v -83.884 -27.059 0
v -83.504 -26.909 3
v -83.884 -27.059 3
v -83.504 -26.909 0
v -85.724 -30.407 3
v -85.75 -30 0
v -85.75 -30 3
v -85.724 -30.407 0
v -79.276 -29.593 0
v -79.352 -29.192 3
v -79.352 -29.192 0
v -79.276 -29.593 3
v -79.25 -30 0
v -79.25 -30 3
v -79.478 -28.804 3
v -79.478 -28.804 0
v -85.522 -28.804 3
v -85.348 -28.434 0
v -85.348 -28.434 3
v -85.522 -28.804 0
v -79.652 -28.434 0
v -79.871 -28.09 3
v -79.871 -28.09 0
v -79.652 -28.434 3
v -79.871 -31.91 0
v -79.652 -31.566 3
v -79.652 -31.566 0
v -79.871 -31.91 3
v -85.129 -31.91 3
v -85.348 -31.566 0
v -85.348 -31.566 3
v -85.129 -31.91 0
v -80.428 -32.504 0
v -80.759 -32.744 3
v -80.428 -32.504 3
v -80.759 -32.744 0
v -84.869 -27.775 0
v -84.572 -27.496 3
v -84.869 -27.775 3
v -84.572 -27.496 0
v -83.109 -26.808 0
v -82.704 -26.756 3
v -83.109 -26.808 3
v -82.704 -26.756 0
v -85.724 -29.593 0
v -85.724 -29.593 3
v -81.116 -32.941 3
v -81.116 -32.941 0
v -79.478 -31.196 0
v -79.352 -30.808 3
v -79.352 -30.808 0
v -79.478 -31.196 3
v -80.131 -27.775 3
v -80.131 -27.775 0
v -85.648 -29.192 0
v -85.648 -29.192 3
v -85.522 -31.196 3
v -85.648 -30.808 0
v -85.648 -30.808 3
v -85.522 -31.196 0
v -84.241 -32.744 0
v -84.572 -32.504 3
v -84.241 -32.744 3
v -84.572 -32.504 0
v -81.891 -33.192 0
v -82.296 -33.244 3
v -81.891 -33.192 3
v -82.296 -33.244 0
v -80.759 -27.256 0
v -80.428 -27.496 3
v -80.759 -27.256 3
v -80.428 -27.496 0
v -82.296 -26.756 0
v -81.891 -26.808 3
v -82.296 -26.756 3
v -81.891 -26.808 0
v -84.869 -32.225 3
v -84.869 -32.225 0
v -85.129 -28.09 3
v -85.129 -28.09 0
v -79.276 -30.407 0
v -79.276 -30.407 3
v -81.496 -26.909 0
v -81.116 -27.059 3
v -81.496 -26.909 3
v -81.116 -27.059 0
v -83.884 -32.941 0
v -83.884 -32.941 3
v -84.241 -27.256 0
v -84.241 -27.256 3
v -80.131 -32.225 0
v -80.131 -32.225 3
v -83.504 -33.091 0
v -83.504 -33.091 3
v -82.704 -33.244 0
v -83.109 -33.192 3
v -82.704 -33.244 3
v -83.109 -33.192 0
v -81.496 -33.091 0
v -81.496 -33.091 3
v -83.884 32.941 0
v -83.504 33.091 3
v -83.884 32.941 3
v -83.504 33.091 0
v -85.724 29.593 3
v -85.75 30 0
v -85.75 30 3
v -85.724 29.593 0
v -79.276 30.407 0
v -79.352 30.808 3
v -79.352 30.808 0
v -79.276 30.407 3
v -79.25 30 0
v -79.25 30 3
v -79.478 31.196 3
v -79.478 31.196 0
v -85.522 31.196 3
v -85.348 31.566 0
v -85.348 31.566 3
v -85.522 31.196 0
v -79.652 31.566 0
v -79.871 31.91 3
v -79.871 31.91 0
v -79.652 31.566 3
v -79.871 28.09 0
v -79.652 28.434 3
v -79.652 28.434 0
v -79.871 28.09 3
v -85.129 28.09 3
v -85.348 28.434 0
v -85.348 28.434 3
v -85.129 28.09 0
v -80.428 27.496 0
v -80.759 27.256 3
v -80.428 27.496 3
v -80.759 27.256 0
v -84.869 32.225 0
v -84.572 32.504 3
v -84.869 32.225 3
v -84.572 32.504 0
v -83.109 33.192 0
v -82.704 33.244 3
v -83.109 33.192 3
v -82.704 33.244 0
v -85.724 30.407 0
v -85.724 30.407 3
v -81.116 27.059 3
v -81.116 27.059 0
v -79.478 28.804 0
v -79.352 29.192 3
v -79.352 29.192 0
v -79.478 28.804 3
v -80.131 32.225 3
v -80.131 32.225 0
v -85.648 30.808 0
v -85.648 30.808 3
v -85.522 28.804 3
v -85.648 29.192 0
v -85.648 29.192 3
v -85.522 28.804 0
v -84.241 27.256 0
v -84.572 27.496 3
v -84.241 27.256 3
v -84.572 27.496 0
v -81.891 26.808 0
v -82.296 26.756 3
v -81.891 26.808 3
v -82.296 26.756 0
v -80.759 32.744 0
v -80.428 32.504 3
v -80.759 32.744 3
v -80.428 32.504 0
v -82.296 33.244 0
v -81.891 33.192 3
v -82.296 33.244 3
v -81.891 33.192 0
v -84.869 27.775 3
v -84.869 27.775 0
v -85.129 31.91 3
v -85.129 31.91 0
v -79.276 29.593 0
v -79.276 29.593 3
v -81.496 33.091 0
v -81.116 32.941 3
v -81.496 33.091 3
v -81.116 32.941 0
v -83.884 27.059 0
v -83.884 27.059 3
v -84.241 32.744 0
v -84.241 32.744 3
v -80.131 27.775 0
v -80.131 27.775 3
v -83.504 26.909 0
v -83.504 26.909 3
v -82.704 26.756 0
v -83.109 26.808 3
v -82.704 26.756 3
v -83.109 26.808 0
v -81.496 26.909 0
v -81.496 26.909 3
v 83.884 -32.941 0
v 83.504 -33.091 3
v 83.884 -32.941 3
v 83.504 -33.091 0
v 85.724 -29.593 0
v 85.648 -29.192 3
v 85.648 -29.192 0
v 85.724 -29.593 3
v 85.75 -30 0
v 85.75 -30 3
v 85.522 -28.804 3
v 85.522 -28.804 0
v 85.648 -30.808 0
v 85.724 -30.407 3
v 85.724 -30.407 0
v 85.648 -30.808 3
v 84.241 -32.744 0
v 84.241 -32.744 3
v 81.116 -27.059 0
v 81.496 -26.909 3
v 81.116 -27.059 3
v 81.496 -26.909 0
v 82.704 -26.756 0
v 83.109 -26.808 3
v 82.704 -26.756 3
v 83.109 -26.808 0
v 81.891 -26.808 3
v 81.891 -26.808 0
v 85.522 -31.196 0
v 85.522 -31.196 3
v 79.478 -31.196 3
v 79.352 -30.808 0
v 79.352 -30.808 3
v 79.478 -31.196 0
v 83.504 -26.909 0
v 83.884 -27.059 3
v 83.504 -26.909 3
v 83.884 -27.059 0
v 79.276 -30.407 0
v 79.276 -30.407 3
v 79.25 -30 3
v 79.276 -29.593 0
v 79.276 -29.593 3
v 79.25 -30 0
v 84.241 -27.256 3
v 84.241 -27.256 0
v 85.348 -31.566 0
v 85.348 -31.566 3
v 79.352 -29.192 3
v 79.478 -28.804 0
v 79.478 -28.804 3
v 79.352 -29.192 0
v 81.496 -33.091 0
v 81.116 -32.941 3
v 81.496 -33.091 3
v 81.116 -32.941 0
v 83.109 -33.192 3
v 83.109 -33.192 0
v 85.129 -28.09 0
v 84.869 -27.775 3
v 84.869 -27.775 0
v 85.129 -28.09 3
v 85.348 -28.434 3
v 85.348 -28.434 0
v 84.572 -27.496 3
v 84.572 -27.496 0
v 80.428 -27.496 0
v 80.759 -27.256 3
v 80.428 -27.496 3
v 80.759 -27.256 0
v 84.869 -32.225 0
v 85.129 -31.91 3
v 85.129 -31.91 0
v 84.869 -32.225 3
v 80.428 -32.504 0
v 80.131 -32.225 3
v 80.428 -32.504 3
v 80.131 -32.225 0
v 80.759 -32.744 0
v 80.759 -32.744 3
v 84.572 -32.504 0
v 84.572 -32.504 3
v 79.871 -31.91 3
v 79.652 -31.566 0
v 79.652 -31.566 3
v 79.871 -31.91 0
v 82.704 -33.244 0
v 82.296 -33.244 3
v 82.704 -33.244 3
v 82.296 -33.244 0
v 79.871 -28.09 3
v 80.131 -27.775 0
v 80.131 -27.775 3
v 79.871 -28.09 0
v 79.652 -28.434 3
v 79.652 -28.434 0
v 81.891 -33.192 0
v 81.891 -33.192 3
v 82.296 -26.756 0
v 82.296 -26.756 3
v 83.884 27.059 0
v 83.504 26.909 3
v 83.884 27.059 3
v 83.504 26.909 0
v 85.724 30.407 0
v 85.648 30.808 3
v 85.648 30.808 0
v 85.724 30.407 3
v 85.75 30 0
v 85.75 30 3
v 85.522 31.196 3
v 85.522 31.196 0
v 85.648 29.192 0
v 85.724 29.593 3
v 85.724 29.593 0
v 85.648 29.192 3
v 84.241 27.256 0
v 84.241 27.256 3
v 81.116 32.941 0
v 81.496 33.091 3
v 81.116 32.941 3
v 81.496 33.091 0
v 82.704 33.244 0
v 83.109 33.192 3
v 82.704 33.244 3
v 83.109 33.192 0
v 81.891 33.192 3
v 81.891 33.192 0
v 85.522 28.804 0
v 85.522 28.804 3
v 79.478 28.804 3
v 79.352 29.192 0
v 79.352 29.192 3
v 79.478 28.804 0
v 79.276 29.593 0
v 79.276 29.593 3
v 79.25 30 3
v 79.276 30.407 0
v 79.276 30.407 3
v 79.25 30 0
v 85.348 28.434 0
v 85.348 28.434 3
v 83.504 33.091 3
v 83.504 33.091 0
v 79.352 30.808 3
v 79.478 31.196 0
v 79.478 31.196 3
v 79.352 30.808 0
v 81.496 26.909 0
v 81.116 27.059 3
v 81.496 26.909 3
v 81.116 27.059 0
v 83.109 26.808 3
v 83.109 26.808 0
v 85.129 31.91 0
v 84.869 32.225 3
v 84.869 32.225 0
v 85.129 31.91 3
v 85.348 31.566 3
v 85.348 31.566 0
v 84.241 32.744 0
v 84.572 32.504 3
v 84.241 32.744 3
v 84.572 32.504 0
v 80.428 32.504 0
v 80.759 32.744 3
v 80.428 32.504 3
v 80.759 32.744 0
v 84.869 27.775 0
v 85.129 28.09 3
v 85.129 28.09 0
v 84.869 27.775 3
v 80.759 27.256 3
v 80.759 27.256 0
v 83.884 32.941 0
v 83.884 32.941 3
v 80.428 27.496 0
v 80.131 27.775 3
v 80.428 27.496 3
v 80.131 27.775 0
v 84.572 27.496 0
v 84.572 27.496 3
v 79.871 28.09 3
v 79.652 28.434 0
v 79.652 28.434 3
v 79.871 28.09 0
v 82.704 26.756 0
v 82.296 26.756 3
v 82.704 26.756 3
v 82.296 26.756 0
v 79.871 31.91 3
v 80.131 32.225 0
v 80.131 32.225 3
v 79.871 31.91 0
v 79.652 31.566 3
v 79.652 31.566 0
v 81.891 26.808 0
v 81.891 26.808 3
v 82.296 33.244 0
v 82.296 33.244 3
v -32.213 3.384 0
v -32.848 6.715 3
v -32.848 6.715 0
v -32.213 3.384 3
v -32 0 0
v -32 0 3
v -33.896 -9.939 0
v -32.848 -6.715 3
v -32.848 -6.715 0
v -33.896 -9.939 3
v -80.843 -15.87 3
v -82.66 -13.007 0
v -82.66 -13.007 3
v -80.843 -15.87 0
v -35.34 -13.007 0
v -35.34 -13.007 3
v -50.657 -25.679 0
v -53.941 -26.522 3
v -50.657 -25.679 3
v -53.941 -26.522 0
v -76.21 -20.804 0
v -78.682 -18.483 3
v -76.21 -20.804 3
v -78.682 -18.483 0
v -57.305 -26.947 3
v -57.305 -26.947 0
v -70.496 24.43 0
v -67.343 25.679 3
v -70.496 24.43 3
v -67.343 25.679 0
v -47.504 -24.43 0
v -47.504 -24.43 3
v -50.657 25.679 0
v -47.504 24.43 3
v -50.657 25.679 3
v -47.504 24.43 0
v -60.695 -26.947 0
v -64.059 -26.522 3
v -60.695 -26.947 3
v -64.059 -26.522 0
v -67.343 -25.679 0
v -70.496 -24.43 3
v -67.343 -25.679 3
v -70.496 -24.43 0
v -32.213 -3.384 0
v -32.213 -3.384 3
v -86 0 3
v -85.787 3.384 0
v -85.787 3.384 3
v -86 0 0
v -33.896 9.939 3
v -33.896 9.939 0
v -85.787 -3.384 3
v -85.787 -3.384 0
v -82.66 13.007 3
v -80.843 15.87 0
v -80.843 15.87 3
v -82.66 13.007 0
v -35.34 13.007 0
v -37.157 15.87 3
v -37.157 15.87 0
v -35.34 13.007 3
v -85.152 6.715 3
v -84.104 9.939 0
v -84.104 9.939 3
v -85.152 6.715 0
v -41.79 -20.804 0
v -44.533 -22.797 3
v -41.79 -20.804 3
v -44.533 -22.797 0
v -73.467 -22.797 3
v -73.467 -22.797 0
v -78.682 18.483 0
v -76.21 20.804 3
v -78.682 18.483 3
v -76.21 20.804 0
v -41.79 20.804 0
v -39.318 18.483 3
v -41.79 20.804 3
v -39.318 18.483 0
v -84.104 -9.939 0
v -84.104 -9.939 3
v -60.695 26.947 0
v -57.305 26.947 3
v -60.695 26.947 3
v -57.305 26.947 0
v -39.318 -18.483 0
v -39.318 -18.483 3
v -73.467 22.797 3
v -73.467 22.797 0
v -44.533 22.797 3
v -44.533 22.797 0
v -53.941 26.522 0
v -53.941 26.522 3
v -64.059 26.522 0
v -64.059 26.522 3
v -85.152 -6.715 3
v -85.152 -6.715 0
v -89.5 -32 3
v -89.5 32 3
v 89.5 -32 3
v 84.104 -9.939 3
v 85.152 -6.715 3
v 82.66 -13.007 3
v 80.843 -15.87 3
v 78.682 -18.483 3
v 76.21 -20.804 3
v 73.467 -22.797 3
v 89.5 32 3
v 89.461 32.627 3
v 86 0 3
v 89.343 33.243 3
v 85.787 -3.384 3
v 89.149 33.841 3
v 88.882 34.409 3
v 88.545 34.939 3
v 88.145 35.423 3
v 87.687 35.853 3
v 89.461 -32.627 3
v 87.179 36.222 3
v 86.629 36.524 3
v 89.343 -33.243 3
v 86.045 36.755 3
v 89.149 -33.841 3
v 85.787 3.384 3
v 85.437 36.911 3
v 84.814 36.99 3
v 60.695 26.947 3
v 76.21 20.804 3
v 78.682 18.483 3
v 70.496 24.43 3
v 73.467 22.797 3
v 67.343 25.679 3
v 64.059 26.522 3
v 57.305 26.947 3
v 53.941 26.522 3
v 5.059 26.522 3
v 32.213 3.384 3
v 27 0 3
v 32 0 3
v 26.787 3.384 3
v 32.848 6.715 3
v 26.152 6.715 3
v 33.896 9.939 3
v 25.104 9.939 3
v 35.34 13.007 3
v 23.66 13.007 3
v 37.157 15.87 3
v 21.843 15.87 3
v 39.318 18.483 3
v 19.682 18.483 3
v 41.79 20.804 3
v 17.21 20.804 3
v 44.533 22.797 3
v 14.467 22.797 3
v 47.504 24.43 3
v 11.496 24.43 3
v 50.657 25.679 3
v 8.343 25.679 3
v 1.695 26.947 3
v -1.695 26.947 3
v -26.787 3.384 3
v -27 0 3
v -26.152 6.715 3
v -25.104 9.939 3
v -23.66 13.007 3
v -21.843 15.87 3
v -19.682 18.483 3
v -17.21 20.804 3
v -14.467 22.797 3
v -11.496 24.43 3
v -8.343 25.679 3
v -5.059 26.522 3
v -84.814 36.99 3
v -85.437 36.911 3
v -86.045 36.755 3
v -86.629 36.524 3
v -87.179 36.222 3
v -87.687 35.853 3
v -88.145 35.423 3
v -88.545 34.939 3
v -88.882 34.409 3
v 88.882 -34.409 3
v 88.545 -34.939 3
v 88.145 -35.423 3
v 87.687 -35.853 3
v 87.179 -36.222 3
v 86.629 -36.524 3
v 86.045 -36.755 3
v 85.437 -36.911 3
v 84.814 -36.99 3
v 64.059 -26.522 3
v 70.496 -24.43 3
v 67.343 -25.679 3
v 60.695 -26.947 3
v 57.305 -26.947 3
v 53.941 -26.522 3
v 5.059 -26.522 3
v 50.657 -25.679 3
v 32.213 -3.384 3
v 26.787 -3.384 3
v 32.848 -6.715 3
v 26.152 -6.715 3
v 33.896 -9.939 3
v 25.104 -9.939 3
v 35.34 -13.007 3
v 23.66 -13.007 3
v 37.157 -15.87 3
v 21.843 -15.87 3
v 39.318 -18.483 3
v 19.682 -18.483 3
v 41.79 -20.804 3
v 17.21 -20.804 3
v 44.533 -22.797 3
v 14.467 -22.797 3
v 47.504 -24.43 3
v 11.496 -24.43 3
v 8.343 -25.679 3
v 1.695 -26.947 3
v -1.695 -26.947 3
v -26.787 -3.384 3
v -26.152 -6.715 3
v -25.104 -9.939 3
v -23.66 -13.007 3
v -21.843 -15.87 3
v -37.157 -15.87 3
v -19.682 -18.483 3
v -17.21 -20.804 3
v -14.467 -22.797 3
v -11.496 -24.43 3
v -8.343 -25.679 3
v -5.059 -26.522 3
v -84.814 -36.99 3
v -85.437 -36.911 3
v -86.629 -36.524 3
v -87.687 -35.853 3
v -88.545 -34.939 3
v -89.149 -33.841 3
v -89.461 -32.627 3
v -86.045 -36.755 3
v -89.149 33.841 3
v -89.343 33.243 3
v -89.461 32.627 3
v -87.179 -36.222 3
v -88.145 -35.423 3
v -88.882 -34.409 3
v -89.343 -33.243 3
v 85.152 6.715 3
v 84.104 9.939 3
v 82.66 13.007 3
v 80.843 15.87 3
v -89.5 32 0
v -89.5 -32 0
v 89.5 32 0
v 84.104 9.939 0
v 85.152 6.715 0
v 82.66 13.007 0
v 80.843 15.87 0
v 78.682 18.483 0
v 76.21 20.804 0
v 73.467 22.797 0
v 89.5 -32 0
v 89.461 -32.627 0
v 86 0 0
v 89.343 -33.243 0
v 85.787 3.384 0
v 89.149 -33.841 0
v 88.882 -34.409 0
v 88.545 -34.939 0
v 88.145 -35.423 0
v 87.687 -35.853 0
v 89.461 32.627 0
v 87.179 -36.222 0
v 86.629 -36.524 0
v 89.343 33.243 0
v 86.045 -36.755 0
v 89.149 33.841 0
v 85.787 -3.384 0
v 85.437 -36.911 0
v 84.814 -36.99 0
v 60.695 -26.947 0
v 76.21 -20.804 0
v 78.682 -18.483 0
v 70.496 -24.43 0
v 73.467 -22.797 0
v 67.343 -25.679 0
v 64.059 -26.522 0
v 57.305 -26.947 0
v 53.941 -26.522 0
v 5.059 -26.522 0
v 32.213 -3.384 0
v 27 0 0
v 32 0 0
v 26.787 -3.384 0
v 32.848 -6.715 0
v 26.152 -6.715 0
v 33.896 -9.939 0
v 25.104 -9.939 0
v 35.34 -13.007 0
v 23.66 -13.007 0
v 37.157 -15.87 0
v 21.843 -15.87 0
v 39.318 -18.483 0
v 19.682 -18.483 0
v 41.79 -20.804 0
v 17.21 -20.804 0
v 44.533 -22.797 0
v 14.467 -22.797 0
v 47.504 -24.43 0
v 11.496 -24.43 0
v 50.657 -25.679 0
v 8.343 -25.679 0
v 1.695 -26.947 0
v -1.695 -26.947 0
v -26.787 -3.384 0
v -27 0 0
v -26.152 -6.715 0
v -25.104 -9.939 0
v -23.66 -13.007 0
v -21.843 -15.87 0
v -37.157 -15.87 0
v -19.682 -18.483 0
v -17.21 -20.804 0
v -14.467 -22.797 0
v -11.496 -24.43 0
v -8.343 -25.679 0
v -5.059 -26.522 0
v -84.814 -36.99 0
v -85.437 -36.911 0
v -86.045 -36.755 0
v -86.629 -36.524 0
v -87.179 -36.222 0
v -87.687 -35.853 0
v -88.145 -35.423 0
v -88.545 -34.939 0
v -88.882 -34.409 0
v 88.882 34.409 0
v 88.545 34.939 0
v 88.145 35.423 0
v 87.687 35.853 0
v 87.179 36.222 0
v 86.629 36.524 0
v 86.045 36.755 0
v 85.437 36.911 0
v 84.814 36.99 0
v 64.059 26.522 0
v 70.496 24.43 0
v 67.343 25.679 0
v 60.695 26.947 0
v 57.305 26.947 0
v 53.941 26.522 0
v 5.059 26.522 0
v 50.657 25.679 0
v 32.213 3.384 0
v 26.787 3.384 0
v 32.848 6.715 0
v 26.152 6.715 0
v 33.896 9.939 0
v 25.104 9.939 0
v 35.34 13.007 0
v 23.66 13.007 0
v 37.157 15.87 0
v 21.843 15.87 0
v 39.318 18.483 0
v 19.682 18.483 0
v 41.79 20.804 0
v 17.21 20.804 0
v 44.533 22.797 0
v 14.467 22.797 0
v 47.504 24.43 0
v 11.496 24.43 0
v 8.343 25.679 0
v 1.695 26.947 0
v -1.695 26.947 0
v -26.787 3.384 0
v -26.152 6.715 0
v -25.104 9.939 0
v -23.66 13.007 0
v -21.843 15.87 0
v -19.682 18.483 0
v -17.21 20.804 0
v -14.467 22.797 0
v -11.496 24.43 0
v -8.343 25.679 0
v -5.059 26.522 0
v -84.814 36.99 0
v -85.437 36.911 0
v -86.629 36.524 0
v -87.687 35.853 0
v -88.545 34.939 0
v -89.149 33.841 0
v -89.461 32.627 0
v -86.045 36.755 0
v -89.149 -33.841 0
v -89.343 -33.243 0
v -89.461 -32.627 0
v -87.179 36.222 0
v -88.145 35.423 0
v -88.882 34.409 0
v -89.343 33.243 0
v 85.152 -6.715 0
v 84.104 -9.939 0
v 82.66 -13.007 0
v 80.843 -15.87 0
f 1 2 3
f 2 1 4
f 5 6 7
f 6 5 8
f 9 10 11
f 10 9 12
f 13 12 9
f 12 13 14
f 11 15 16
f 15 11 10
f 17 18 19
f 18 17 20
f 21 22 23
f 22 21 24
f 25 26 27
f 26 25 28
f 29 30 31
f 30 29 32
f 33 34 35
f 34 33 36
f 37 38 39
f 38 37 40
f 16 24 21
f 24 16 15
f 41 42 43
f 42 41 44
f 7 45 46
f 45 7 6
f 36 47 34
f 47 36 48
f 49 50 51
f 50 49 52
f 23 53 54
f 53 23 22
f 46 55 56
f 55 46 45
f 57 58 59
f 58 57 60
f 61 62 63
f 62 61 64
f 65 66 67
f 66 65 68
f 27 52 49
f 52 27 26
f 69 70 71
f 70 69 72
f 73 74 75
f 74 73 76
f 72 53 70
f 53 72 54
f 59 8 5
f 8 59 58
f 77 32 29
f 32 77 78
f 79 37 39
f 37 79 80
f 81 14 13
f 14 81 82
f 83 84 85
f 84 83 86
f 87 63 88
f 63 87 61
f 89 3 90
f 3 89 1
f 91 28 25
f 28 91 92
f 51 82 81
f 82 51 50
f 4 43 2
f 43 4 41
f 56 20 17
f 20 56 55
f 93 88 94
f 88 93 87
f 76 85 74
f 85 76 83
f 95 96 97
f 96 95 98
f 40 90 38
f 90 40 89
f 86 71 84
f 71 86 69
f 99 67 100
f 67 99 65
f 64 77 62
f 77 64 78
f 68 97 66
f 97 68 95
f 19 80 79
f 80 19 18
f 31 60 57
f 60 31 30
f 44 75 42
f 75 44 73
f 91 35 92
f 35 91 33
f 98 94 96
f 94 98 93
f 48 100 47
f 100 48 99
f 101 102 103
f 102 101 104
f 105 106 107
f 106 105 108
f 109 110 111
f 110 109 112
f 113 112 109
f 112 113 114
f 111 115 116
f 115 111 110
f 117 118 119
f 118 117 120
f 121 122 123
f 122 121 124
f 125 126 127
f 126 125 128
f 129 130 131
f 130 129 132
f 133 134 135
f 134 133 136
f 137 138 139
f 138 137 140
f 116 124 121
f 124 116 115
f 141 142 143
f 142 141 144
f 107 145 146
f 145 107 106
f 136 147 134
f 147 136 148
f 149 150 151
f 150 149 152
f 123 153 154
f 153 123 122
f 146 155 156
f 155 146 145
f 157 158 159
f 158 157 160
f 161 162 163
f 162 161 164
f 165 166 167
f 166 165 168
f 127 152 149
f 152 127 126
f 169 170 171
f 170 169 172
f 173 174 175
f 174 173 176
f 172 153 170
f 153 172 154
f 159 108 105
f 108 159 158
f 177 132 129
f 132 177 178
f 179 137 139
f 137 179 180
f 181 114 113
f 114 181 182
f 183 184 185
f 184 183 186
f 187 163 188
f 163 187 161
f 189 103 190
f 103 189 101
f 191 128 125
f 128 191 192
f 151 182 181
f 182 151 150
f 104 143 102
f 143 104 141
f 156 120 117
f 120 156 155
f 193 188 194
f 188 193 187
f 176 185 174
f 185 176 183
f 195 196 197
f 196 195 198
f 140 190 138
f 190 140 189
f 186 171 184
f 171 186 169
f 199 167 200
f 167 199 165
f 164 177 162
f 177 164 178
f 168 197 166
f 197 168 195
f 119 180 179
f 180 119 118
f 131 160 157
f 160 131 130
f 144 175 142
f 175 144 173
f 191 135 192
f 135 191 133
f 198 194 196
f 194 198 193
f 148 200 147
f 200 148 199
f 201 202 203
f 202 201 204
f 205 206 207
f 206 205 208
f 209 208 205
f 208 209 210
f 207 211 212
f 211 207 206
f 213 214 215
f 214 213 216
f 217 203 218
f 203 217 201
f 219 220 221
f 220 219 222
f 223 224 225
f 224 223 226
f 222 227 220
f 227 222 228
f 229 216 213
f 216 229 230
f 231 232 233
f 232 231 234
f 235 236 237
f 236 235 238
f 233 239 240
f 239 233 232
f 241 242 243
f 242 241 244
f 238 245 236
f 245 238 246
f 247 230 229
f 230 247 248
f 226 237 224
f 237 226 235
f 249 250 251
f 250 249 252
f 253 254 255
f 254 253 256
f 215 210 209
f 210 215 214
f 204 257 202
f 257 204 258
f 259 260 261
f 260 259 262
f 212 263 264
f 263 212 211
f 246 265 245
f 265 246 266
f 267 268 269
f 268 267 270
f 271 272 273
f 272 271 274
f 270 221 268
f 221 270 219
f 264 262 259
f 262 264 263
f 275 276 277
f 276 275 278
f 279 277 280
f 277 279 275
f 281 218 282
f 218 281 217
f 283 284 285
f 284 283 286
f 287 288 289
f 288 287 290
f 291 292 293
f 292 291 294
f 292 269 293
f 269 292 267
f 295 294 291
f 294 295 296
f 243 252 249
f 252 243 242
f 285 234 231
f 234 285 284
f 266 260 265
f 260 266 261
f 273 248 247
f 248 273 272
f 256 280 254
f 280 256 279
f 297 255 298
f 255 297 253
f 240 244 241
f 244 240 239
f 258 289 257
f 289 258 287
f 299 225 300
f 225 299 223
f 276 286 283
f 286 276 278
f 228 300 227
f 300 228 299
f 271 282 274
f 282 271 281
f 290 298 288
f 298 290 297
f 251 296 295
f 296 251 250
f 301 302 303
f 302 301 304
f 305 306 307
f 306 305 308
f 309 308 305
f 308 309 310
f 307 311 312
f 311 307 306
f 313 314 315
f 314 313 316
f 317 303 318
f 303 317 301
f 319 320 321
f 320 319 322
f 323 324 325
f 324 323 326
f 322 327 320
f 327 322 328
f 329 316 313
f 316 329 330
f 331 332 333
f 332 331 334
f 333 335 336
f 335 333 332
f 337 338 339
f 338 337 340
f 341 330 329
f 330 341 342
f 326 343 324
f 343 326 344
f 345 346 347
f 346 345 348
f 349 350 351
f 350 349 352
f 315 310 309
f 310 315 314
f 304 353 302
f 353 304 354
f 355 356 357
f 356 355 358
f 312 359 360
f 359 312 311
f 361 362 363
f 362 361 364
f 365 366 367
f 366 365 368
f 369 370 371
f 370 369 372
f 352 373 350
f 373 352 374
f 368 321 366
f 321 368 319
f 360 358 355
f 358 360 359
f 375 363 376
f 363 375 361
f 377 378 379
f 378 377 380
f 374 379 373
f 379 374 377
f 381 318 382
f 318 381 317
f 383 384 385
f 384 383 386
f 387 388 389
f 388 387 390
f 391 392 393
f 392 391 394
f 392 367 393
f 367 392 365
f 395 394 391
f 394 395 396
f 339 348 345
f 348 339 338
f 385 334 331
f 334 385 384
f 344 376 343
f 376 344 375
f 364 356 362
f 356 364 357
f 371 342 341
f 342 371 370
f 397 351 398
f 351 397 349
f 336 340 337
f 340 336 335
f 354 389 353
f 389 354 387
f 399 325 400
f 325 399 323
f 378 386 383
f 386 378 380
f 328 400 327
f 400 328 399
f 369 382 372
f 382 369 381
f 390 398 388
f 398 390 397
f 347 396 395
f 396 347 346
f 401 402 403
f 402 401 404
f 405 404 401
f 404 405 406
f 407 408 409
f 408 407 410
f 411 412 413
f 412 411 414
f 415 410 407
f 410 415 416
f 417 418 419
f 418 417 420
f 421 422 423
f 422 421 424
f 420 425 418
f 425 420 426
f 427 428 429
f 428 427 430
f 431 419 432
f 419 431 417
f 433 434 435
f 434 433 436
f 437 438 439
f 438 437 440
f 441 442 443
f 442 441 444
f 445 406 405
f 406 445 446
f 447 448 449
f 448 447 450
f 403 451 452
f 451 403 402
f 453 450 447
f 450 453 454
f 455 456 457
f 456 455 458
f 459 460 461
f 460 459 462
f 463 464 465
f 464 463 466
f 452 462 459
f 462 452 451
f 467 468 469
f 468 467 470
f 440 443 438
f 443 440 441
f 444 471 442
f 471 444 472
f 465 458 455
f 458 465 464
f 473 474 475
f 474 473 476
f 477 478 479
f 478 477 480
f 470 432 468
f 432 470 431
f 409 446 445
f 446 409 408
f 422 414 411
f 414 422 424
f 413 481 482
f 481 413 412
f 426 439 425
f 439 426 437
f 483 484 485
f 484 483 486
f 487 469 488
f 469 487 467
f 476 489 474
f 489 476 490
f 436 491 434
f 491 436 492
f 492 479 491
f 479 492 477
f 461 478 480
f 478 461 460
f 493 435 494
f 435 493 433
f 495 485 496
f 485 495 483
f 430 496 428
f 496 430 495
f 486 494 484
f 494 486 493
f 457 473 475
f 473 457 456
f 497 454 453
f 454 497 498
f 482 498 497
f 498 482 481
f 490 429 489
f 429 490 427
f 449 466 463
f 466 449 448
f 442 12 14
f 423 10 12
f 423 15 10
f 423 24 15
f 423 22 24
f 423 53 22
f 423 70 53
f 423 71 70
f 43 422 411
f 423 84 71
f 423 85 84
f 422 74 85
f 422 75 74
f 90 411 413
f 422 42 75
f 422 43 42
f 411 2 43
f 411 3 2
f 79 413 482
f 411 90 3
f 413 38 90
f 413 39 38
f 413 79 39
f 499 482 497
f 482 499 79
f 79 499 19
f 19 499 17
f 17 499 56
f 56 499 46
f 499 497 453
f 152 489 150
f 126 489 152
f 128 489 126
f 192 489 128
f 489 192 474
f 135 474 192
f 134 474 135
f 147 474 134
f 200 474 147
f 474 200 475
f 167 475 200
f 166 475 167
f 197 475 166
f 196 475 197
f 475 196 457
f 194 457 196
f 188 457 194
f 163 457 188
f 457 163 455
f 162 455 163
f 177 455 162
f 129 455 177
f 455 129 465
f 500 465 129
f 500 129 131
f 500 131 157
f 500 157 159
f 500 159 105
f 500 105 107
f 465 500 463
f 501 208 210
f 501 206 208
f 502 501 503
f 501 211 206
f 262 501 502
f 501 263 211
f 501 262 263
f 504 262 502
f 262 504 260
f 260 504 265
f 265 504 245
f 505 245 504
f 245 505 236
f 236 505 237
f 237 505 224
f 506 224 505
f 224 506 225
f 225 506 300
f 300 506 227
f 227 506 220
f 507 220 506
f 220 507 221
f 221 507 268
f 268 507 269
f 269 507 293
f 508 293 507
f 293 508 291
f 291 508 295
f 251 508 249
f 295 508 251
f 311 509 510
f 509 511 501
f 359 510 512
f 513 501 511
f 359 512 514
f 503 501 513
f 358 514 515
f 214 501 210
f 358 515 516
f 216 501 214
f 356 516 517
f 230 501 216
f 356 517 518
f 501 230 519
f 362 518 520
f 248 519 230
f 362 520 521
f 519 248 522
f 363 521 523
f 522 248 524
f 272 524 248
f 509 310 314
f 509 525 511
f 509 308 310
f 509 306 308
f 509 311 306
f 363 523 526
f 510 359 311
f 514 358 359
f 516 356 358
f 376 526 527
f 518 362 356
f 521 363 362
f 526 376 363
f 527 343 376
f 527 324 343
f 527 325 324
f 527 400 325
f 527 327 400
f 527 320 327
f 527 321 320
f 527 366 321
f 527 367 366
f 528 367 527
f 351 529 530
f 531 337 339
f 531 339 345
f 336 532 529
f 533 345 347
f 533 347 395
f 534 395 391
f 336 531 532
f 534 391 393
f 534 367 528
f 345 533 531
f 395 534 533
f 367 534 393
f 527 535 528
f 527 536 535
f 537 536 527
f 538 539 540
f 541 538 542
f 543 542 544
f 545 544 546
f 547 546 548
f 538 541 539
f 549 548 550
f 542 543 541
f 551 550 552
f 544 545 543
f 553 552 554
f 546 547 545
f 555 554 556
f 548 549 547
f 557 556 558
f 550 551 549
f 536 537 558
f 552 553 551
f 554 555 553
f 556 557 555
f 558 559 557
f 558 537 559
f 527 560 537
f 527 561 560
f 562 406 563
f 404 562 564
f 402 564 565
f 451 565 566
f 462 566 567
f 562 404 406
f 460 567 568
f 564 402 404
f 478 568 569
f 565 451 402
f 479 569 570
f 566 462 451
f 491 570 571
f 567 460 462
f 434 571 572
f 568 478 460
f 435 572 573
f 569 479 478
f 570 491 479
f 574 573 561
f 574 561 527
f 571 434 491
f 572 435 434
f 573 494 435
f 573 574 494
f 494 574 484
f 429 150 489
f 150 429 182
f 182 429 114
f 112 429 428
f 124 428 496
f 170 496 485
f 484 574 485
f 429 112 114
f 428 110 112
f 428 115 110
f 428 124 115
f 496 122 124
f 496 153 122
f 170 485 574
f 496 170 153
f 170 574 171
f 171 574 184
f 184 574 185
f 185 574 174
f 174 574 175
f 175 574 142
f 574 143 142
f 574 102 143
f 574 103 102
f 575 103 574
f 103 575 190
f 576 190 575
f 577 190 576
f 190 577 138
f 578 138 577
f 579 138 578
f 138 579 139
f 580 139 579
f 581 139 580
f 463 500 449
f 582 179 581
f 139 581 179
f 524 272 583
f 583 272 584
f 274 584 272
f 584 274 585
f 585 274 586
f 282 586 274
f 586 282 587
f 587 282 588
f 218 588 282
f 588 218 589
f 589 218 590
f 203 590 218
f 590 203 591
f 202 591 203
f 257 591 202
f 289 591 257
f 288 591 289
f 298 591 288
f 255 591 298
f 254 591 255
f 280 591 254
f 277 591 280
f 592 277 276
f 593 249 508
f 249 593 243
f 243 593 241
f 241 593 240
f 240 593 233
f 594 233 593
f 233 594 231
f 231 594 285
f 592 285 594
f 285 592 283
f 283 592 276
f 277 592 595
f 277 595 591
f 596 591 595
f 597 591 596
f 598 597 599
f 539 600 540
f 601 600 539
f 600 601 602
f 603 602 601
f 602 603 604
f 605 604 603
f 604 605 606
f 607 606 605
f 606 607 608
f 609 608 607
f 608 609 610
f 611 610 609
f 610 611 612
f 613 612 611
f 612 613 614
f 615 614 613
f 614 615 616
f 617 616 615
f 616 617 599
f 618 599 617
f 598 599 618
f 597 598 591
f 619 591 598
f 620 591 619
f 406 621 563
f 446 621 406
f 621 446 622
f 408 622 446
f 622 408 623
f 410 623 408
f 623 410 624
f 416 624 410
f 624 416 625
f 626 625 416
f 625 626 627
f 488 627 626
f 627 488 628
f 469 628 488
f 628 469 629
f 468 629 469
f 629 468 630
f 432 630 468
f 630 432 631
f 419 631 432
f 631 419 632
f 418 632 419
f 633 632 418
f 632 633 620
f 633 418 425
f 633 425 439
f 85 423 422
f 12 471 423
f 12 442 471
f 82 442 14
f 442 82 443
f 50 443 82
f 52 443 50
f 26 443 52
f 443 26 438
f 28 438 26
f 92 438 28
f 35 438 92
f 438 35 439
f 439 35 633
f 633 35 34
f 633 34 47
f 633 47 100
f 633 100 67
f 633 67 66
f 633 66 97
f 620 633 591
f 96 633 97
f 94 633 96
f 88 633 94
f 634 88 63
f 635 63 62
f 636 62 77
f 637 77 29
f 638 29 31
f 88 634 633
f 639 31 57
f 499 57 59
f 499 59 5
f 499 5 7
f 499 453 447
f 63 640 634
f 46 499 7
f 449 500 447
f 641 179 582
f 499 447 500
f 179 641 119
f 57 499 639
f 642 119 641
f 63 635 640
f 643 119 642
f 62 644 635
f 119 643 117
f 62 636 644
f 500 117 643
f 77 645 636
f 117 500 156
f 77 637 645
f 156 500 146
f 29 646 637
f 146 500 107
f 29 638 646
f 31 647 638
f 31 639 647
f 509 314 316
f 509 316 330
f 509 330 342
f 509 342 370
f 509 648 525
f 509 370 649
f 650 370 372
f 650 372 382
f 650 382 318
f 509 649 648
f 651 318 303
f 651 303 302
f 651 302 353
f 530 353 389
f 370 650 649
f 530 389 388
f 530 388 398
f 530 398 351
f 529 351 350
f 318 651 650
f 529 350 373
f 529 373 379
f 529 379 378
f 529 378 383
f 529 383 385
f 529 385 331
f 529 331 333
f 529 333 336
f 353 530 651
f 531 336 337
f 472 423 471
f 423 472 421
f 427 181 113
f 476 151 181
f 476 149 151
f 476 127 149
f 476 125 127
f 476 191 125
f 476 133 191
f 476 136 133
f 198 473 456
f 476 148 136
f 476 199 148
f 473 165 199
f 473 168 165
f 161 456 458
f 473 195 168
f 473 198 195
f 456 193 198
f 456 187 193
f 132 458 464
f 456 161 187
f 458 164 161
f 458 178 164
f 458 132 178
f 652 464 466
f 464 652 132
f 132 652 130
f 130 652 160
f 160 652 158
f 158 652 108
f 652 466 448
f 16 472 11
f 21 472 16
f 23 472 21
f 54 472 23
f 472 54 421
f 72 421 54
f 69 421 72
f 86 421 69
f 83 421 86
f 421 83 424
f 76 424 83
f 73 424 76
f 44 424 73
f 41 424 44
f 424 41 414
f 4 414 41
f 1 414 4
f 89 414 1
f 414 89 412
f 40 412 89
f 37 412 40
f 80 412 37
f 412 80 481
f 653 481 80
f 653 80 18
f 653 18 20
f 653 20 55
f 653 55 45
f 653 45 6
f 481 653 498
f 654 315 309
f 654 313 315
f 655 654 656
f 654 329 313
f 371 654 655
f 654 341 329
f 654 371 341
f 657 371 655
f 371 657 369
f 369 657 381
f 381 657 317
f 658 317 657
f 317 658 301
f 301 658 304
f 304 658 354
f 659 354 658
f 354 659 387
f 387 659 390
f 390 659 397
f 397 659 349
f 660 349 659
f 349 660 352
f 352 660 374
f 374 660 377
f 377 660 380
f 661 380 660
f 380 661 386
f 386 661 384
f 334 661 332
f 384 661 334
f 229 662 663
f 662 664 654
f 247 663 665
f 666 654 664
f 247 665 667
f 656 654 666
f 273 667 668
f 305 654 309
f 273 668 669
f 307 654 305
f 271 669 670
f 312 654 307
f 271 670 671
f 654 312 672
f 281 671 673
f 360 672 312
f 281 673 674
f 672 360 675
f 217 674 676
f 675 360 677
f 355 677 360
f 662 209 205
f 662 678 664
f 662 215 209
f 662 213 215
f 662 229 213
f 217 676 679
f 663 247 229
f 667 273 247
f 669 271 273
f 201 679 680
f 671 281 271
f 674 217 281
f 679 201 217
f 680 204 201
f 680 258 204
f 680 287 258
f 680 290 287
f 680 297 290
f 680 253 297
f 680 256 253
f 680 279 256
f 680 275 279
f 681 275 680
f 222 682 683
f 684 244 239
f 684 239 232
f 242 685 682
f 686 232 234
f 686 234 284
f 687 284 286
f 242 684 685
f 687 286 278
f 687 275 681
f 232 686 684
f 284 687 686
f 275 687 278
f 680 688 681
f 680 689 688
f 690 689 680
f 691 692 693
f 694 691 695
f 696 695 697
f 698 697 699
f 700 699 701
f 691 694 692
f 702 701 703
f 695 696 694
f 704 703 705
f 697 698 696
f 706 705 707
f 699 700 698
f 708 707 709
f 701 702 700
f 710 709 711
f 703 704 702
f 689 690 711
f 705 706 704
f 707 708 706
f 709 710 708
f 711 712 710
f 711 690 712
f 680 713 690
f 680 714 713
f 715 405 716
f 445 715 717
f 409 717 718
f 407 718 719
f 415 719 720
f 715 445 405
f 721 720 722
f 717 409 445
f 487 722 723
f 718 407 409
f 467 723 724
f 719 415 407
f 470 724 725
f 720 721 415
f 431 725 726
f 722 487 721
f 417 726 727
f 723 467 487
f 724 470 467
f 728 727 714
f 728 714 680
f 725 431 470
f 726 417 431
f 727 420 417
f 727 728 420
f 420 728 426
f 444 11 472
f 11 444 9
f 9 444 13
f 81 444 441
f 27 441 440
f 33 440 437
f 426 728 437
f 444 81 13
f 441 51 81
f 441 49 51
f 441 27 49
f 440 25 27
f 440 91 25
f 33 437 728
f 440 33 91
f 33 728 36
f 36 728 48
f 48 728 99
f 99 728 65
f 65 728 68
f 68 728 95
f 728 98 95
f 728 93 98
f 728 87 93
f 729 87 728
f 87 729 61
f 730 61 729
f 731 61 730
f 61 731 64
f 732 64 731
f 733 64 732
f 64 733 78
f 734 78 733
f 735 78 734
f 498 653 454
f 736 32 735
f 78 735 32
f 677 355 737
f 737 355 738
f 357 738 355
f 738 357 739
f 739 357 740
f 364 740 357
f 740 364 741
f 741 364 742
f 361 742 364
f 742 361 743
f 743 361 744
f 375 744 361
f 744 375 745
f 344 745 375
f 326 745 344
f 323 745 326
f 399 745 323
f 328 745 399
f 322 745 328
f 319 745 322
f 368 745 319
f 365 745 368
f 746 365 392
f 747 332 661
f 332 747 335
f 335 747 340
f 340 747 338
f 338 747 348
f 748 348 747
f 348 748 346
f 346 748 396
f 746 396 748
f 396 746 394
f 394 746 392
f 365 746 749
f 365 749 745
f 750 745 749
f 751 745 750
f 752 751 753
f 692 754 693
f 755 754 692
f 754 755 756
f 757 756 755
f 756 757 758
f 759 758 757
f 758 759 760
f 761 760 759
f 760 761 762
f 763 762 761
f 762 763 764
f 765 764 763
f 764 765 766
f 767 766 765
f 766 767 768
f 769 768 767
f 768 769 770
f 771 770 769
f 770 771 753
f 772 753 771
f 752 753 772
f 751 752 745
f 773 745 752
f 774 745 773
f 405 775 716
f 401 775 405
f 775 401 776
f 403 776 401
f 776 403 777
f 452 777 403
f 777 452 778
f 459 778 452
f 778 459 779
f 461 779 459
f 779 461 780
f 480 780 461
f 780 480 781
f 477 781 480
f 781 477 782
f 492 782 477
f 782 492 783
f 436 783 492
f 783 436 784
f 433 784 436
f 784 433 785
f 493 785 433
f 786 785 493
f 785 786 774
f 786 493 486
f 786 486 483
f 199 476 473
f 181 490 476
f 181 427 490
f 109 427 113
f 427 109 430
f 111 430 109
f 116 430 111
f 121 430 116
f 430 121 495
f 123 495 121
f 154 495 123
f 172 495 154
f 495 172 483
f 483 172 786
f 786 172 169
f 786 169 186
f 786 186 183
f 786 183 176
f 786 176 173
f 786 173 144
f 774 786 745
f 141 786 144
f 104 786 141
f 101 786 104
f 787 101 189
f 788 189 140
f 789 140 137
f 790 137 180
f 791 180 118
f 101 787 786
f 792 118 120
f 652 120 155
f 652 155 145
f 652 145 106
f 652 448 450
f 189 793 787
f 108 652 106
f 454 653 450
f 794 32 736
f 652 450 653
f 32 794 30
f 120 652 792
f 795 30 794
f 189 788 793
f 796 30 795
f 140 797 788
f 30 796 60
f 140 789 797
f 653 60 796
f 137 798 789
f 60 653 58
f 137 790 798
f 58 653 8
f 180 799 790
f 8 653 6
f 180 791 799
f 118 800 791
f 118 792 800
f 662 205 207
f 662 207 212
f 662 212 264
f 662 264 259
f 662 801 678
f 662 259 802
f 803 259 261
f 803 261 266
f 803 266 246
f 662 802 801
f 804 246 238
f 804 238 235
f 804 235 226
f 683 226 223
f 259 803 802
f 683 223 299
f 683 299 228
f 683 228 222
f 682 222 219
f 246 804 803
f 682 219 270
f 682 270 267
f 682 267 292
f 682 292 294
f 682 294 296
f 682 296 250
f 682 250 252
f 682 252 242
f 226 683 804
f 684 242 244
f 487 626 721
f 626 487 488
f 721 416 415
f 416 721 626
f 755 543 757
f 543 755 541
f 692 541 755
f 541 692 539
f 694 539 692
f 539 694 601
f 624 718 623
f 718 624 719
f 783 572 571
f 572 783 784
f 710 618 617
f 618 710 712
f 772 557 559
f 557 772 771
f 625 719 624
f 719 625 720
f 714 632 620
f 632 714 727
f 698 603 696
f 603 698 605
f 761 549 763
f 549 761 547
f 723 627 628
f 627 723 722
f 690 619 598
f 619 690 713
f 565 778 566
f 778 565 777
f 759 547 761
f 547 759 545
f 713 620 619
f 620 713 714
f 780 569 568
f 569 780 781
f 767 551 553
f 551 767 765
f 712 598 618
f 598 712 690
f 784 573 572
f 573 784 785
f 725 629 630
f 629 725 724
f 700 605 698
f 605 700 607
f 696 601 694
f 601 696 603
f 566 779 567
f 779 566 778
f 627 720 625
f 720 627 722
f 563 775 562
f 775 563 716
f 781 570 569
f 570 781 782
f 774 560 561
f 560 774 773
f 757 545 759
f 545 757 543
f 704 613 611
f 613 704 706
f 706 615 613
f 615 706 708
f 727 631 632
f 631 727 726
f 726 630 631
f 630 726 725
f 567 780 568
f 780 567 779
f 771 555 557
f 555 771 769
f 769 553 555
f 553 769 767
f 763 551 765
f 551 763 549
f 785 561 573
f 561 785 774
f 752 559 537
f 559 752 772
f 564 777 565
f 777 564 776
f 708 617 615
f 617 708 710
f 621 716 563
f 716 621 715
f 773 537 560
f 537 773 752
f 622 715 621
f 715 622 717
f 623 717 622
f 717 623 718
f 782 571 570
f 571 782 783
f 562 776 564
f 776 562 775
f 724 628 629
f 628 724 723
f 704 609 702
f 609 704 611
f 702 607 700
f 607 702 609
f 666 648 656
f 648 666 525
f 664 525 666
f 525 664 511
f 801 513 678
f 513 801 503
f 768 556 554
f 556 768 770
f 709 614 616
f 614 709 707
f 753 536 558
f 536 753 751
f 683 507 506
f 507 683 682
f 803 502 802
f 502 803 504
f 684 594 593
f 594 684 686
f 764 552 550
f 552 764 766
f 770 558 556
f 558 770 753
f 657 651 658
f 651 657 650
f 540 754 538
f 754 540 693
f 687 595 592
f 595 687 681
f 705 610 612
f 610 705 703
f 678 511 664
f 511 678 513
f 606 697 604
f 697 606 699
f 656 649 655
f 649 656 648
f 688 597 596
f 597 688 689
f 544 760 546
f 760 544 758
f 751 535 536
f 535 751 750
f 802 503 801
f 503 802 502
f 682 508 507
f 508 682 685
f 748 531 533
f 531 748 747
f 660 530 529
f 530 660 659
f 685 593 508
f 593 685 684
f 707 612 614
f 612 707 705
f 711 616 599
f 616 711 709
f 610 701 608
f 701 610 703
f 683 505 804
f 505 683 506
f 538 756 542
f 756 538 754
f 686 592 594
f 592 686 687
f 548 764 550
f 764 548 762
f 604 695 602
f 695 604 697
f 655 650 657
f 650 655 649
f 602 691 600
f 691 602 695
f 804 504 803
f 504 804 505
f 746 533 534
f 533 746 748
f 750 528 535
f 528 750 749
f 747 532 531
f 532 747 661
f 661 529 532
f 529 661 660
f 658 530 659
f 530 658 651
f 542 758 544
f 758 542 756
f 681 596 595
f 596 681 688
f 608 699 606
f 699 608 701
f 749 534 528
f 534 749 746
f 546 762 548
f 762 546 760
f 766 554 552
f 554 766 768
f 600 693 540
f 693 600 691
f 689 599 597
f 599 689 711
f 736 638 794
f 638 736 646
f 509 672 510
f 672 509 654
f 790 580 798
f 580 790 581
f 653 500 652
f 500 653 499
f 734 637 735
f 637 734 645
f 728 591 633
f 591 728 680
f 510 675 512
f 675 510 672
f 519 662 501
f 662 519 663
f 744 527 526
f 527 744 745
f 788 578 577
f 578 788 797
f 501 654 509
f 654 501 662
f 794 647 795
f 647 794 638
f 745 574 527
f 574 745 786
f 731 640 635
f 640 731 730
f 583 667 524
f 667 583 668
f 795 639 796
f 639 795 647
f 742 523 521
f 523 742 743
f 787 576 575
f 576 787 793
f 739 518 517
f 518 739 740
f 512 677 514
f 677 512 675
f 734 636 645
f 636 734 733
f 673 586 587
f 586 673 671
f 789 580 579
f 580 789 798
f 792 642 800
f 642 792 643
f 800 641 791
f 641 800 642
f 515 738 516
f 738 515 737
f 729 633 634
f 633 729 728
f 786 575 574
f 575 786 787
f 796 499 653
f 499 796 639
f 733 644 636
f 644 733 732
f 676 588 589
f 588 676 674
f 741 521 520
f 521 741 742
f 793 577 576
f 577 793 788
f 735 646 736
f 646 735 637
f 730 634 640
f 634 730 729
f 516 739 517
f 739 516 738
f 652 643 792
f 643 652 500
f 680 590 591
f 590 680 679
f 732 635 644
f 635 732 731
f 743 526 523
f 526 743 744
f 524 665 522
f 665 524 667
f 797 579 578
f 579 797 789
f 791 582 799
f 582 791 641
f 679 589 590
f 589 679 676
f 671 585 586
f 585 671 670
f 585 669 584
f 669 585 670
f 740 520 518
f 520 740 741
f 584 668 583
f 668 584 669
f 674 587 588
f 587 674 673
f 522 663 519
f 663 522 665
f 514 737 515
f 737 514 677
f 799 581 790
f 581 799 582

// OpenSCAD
$fn = 50;


difference() {
	union() {
		hull() {
			translate(v = [-84.5000000000, 32.0000000000, 0]) {
				cylinder(h = 3, r = 5);
			}
			translate(v = [84.5000000000, 32.0000000000, 0]) {
				cylinder(h = 3, r = 5);
			}
			translate(v = [-84.5000000000, -32.0000000000, 0]) {
				cylinder(h = 3, r = 5);
			}
			translate(v = [84.5000000000, -32.0000000000, 0]) {
				cylinder(h = 3, r = 5);
			}
		}
	}
	union() {
		#translate(v = [-82.5000000000, -30.0000000000, -100.0000000000]) {
			cylinder(h = 200, r = 3.2500000000);
		}
		#translate(v = [-82.5000000000, 30.0000000000, -100.0000000000]) {
			cylinder(h = 200, r = 3.2500000000);
		}
		#translate(v = [82.5000000000, -30.0000000000, -100.0000000000]) {
			cylinder(h = 200, r = 3.2500000000);
		}
		#translate(v = [82.5000000000, 30.0000000000, -100.0000000000]) {
			cylinder(h = 200, r = 3.2500000000);
		}
		#translate(v = [-59.0000000000, 0, 0]) {
			cylinder(h = 3, r = 27.0000000000);
		}
		#cylinder(h = 3, r = 27.0000000000);
		#translate(v = [59.0000000000, 0, 0]) {
			cylinder(h = 3, r = 27.0000000000);
		}
	}
}
